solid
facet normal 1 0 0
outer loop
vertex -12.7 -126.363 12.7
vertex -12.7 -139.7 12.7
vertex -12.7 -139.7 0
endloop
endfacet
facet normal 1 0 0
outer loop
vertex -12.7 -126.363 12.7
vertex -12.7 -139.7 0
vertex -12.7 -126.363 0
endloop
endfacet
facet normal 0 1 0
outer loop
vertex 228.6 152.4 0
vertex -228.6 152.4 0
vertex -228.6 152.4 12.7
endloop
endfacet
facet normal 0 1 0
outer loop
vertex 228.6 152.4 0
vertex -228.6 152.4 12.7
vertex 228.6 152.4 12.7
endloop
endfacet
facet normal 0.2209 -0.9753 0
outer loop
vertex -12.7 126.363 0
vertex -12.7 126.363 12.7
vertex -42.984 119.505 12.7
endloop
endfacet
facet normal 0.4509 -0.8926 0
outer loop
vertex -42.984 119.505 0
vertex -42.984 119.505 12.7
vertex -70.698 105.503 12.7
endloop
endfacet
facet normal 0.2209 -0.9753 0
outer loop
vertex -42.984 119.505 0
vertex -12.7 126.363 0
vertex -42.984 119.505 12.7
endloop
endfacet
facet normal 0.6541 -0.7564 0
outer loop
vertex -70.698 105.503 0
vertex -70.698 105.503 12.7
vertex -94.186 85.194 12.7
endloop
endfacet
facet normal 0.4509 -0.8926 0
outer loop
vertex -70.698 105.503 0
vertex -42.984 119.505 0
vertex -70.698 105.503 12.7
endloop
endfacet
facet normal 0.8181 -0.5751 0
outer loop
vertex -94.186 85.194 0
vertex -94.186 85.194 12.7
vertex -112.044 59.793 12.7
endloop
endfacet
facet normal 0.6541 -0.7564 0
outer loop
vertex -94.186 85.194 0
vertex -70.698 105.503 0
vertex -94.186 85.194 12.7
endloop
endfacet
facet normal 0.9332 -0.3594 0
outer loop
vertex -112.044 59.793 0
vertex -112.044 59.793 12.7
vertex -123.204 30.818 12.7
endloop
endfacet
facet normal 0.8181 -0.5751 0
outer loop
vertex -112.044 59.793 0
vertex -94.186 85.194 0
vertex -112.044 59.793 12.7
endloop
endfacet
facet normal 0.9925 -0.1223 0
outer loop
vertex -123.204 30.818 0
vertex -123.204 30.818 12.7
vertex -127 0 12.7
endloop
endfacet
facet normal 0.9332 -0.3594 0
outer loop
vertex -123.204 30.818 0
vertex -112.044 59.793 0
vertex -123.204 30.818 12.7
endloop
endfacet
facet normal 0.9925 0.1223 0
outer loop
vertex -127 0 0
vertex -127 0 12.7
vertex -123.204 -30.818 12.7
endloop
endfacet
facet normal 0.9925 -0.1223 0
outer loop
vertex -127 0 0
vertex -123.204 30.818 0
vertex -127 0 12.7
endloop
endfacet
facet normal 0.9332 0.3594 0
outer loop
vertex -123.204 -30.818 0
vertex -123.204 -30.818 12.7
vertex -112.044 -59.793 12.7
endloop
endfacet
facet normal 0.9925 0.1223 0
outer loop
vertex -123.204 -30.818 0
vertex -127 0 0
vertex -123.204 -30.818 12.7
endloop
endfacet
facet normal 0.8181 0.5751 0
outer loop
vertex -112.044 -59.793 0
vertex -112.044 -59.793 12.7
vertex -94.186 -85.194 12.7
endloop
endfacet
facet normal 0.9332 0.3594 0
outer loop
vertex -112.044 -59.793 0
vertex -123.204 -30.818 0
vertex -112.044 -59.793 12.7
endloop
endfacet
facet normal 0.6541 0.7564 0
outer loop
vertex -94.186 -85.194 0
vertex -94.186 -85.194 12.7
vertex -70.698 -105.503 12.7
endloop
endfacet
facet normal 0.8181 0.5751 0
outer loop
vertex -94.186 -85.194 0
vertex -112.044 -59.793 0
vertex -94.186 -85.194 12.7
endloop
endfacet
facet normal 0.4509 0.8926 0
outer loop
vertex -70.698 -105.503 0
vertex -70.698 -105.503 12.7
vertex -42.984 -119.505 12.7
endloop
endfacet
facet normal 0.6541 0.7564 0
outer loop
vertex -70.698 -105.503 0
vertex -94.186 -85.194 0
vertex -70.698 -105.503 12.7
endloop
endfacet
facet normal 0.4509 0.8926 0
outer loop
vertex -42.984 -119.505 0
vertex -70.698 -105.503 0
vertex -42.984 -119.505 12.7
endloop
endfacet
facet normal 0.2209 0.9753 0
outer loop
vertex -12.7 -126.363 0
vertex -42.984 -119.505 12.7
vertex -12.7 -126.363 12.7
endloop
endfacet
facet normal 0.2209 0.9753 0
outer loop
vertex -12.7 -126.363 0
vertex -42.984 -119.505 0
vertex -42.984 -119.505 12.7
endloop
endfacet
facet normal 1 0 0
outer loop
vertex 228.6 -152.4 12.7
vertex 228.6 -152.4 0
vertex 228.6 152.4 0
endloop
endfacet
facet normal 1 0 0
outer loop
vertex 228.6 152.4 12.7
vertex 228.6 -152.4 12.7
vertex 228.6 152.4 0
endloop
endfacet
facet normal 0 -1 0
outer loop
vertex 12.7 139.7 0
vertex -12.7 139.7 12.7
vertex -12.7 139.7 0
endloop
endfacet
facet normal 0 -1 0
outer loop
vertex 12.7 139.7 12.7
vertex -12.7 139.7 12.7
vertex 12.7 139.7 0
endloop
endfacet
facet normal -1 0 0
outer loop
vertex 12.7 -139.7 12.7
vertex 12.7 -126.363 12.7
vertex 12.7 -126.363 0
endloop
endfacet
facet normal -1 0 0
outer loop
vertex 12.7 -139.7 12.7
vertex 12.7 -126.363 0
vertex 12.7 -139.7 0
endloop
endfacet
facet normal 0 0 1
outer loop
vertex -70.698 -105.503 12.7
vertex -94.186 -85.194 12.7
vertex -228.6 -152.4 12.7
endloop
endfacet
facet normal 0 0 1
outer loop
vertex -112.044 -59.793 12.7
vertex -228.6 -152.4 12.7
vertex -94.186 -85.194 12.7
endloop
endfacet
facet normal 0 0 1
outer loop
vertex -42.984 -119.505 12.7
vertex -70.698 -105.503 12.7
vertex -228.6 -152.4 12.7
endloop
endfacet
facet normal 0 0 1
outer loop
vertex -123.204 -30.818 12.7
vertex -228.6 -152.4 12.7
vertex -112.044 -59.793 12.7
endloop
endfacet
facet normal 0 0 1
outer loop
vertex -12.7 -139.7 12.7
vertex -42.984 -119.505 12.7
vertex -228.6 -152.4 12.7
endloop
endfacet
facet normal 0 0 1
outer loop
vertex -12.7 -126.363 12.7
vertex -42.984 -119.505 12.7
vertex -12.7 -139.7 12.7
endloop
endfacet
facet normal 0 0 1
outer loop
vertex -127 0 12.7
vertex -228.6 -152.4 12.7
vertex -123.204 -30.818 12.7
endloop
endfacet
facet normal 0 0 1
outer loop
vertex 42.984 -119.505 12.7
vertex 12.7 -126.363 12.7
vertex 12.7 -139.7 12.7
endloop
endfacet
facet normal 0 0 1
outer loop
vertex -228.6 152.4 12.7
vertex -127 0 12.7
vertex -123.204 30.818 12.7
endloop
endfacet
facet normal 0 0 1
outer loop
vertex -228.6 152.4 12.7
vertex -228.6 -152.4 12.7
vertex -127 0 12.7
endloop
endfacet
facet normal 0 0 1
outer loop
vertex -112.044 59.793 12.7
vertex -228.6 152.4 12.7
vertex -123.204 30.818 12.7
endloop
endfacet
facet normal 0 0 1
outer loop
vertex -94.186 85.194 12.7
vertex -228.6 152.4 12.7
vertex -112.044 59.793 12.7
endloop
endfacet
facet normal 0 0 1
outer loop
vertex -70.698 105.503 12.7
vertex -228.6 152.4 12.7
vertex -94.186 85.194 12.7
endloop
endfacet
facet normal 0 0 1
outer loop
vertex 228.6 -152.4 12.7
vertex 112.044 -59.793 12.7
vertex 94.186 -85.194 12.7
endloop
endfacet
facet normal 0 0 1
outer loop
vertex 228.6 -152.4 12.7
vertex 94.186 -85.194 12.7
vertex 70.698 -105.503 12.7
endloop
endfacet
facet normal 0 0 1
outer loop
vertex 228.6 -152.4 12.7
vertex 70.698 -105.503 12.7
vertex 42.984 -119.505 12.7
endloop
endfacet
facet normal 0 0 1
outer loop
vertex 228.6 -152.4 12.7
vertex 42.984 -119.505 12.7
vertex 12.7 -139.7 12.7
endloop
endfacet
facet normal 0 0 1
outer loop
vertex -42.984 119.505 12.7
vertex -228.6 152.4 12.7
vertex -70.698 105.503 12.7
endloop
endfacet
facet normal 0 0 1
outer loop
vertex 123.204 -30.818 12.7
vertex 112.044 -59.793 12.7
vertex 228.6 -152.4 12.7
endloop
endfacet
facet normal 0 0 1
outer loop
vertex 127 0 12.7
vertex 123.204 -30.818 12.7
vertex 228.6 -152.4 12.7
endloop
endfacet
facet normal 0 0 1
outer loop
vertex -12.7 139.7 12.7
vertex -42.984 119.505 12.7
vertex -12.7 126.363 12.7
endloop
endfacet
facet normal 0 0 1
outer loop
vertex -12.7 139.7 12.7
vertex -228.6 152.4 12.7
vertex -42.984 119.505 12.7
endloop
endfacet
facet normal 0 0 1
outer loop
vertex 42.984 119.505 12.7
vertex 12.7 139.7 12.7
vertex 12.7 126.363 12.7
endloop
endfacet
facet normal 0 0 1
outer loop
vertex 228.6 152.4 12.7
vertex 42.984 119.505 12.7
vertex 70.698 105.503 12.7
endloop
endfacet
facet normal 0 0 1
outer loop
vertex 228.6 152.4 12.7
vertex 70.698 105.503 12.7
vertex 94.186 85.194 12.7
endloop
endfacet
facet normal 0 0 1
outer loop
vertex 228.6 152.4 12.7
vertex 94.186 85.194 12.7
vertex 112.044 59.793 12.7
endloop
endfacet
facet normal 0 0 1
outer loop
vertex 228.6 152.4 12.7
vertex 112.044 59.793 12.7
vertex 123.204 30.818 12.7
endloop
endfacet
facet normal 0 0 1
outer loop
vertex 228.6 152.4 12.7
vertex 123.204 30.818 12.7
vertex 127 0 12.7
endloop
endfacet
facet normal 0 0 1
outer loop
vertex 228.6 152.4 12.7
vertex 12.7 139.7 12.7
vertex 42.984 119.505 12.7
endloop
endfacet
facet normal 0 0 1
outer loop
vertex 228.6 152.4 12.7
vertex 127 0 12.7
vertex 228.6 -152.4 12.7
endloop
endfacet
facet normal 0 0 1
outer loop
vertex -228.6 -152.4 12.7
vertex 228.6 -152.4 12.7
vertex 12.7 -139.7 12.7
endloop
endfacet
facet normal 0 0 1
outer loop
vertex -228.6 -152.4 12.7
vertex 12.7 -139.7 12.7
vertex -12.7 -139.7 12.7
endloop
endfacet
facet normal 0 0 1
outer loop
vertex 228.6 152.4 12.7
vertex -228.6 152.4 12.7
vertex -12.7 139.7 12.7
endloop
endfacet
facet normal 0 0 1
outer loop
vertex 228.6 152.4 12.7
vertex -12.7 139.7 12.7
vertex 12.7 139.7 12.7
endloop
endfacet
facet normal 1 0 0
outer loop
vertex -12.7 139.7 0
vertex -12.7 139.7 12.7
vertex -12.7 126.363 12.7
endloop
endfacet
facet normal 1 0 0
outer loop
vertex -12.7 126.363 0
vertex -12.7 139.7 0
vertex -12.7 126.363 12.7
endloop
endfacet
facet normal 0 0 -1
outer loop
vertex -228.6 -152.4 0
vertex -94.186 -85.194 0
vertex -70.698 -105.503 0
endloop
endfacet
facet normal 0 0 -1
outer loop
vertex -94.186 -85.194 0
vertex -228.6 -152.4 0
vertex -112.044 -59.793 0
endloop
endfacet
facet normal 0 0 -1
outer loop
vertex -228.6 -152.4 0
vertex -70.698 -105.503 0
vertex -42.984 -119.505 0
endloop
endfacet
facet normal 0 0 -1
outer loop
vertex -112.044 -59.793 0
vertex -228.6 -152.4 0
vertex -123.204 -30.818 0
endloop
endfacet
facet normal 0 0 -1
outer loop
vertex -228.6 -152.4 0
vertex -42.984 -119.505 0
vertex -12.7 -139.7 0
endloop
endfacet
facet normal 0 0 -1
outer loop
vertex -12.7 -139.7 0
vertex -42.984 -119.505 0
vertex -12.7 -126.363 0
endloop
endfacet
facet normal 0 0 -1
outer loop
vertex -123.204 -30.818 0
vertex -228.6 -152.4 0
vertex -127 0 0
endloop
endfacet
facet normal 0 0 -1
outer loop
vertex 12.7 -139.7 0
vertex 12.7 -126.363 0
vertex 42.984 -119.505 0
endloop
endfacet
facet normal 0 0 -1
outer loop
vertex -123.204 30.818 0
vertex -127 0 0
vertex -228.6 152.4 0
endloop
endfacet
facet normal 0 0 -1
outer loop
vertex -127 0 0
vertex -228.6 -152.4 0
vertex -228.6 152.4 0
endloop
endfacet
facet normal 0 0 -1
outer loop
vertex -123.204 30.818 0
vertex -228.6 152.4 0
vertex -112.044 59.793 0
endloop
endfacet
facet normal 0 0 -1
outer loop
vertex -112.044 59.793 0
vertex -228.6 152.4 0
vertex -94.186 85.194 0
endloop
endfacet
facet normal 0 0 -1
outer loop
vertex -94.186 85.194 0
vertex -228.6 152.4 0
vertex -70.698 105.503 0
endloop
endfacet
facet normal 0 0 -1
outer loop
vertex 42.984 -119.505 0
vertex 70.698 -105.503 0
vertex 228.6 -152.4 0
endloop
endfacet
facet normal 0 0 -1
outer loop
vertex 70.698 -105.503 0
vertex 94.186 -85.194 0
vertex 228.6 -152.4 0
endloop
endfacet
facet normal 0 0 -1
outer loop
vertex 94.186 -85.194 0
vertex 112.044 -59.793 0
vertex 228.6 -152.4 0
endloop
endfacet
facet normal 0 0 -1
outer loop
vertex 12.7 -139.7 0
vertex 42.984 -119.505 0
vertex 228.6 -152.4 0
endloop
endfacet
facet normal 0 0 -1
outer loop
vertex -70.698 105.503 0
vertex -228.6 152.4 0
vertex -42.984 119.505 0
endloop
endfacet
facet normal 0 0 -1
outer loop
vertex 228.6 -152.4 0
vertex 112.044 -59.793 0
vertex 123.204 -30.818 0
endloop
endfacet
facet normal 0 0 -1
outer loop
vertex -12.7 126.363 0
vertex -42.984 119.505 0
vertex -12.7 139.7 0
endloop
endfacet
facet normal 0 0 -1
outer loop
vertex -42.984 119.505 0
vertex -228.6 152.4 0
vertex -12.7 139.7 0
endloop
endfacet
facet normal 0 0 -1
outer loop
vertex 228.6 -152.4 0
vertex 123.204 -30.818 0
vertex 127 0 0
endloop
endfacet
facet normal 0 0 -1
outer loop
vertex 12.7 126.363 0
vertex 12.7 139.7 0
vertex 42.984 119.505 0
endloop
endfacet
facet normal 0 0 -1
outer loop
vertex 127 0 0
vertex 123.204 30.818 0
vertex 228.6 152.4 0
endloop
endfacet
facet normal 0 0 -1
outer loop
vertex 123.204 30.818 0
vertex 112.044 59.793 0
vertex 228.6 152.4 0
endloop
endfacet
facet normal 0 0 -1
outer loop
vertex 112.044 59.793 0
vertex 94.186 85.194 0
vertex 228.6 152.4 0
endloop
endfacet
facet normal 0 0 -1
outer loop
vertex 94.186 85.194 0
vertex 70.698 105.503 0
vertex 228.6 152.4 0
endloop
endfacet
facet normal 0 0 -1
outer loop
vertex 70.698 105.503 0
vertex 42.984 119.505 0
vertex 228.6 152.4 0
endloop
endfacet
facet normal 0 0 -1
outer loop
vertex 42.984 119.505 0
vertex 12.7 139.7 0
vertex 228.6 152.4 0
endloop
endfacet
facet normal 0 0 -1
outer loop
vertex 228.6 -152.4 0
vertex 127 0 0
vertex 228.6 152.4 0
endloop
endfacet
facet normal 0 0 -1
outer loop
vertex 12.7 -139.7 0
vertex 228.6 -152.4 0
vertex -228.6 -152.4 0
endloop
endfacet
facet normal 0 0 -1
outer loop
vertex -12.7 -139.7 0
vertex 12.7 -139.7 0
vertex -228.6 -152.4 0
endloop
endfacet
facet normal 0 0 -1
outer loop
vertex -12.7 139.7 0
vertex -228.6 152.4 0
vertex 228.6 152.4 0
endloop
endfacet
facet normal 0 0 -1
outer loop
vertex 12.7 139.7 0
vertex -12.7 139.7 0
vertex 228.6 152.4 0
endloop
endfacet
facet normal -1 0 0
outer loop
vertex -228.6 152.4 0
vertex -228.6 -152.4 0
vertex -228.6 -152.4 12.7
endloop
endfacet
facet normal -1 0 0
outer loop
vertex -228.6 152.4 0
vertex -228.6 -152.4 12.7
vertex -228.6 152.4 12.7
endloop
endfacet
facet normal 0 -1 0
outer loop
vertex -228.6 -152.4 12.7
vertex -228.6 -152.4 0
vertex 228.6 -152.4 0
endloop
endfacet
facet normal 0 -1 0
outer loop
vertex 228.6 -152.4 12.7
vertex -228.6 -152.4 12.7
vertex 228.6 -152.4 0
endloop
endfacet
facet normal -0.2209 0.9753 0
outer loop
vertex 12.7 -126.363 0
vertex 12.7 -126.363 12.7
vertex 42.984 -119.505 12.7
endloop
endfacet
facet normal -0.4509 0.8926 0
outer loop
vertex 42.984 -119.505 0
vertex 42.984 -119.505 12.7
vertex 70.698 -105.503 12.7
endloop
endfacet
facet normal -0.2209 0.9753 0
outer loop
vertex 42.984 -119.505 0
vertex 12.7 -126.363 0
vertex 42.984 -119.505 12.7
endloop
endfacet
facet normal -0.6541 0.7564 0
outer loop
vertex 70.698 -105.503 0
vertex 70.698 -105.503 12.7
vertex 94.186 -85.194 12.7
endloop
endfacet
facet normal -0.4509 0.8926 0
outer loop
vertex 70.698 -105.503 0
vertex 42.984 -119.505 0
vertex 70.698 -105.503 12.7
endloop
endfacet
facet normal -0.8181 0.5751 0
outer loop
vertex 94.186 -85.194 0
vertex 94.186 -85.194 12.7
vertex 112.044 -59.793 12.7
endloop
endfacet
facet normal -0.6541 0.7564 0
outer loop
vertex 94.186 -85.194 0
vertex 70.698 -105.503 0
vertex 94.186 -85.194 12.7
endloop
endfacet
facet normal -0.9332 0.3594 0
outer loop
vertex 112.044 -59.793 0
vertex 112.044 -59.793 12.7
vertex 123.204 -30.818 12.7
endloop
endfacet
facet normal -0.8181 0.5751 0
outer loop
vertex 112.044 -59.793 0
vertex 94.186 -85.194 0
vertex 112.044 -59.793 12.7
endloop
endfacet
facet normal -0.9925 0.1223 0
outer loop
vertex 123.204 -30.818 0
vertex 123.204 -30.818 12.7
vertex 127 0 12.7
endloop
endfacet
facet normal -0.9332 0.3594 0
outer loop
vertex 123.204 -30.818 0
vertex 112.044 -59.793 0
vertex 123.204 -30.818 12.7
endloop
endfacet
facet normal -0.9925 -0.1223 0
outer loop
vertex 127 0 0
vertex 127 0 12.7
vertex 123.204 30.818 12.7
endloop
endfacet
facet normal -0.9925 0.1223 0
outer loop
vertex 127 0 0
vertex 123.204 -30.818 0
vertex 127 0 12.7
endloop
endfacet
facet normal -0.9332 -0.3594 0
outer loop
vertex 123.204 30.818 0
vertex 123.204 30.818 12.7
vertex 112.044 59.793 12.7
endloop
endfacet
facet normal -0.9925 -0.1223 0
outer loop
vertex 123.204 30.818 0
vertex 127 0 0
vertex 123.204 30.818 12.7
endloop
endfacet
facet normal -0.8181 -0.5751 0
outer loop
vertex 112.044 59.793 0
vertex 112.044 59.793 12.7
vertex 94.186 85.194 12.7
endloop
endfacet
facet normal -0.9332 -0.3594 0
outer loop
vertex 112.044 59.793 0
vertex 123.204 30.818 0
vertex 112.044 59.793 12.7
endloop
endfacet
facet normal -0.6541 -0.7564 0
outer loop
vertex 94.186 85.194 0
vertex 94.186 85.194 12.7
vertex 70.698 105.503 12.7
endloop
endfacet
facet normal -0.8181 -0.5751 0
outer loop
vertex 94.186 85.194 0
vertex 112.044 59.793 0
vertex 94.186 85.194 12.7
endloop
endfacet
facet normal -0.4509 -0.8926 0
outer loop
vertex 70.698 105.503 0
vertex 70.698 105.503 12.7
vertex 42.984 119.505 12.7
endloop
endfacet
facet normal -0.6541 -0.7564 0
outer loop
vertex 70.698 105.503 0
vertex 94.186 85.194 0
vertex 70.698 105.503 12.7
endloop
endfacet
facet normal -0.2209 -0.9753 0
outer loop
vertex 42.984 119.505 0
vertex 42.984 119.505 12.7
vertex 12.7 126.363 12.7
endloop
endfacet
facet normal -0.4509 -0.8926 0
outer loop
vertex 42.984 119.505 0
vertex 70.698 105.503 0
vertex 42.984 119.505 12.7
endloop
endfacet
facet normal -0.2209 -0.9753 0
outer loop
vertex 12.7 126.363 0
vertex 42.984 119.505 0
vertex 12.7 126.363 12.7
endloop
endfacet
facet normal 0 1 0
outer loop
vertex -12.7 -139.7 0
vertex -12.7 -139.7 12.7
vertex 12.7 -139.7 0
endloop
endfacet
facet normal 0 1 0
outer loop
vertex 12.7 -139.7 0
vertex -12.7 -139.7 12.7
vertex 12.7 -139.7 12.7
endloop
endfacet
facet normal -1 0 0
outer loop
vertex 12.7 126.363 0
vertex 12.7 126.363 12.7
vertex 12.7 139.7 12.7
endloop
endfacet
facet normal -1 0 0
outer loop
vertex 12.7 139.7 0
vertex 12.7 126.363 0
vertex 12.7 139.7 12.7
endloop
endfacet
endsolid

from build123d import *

# Parameters (mm, degrees)
SKETCH1_W           = 457.2
SKETCH1_H           = 304.8
SKETCH1_R           = 127
BOSS_EXTRUDE1_DEPTH = 12.7
CUT_EXTRUDE2_DEPTH  = 276.036379412


with BuildPart() as part:
    # Sketch1 → Boss-Extrude1 (new body)
    with BuildSketch(Plane.XY):
        Rectangle(SKETCH1_W, SKETCH1_H)
        Circle(SKETCH1_R, mode=Mode.SUBTRACT)
    extrude(amount=BOSS_EXTRUDE1_DEPTH)

    # Sketch2 → Cut-Extrude2 (cut, through all)
    with BuildSketch(Plane.XY.offset(12.7)):
        with BuildLine():
            ThreePointArc((-12.7, 126.363404513), (0, 127), (12.7, 126.363404513))
            Line((12.7, 126.363404513), (12.7, 139.7))
            Line((12.7, 139.7), (-12.7, 139.7))
            Line((-12.7, 139.7), (-12.7, 126.363404513))
        make_face()
    cut_extrude2 = extrude(amount=-CUT_EXTRUDE2_DEPTH, mode=Mode.SUBTRACT)

    # Mirror1: Cut-Extrude2 across plane
    add(cut_extrude2.mirror(Plane.ZX), mode=Mode.SUBTRACT)


solid = part.part
